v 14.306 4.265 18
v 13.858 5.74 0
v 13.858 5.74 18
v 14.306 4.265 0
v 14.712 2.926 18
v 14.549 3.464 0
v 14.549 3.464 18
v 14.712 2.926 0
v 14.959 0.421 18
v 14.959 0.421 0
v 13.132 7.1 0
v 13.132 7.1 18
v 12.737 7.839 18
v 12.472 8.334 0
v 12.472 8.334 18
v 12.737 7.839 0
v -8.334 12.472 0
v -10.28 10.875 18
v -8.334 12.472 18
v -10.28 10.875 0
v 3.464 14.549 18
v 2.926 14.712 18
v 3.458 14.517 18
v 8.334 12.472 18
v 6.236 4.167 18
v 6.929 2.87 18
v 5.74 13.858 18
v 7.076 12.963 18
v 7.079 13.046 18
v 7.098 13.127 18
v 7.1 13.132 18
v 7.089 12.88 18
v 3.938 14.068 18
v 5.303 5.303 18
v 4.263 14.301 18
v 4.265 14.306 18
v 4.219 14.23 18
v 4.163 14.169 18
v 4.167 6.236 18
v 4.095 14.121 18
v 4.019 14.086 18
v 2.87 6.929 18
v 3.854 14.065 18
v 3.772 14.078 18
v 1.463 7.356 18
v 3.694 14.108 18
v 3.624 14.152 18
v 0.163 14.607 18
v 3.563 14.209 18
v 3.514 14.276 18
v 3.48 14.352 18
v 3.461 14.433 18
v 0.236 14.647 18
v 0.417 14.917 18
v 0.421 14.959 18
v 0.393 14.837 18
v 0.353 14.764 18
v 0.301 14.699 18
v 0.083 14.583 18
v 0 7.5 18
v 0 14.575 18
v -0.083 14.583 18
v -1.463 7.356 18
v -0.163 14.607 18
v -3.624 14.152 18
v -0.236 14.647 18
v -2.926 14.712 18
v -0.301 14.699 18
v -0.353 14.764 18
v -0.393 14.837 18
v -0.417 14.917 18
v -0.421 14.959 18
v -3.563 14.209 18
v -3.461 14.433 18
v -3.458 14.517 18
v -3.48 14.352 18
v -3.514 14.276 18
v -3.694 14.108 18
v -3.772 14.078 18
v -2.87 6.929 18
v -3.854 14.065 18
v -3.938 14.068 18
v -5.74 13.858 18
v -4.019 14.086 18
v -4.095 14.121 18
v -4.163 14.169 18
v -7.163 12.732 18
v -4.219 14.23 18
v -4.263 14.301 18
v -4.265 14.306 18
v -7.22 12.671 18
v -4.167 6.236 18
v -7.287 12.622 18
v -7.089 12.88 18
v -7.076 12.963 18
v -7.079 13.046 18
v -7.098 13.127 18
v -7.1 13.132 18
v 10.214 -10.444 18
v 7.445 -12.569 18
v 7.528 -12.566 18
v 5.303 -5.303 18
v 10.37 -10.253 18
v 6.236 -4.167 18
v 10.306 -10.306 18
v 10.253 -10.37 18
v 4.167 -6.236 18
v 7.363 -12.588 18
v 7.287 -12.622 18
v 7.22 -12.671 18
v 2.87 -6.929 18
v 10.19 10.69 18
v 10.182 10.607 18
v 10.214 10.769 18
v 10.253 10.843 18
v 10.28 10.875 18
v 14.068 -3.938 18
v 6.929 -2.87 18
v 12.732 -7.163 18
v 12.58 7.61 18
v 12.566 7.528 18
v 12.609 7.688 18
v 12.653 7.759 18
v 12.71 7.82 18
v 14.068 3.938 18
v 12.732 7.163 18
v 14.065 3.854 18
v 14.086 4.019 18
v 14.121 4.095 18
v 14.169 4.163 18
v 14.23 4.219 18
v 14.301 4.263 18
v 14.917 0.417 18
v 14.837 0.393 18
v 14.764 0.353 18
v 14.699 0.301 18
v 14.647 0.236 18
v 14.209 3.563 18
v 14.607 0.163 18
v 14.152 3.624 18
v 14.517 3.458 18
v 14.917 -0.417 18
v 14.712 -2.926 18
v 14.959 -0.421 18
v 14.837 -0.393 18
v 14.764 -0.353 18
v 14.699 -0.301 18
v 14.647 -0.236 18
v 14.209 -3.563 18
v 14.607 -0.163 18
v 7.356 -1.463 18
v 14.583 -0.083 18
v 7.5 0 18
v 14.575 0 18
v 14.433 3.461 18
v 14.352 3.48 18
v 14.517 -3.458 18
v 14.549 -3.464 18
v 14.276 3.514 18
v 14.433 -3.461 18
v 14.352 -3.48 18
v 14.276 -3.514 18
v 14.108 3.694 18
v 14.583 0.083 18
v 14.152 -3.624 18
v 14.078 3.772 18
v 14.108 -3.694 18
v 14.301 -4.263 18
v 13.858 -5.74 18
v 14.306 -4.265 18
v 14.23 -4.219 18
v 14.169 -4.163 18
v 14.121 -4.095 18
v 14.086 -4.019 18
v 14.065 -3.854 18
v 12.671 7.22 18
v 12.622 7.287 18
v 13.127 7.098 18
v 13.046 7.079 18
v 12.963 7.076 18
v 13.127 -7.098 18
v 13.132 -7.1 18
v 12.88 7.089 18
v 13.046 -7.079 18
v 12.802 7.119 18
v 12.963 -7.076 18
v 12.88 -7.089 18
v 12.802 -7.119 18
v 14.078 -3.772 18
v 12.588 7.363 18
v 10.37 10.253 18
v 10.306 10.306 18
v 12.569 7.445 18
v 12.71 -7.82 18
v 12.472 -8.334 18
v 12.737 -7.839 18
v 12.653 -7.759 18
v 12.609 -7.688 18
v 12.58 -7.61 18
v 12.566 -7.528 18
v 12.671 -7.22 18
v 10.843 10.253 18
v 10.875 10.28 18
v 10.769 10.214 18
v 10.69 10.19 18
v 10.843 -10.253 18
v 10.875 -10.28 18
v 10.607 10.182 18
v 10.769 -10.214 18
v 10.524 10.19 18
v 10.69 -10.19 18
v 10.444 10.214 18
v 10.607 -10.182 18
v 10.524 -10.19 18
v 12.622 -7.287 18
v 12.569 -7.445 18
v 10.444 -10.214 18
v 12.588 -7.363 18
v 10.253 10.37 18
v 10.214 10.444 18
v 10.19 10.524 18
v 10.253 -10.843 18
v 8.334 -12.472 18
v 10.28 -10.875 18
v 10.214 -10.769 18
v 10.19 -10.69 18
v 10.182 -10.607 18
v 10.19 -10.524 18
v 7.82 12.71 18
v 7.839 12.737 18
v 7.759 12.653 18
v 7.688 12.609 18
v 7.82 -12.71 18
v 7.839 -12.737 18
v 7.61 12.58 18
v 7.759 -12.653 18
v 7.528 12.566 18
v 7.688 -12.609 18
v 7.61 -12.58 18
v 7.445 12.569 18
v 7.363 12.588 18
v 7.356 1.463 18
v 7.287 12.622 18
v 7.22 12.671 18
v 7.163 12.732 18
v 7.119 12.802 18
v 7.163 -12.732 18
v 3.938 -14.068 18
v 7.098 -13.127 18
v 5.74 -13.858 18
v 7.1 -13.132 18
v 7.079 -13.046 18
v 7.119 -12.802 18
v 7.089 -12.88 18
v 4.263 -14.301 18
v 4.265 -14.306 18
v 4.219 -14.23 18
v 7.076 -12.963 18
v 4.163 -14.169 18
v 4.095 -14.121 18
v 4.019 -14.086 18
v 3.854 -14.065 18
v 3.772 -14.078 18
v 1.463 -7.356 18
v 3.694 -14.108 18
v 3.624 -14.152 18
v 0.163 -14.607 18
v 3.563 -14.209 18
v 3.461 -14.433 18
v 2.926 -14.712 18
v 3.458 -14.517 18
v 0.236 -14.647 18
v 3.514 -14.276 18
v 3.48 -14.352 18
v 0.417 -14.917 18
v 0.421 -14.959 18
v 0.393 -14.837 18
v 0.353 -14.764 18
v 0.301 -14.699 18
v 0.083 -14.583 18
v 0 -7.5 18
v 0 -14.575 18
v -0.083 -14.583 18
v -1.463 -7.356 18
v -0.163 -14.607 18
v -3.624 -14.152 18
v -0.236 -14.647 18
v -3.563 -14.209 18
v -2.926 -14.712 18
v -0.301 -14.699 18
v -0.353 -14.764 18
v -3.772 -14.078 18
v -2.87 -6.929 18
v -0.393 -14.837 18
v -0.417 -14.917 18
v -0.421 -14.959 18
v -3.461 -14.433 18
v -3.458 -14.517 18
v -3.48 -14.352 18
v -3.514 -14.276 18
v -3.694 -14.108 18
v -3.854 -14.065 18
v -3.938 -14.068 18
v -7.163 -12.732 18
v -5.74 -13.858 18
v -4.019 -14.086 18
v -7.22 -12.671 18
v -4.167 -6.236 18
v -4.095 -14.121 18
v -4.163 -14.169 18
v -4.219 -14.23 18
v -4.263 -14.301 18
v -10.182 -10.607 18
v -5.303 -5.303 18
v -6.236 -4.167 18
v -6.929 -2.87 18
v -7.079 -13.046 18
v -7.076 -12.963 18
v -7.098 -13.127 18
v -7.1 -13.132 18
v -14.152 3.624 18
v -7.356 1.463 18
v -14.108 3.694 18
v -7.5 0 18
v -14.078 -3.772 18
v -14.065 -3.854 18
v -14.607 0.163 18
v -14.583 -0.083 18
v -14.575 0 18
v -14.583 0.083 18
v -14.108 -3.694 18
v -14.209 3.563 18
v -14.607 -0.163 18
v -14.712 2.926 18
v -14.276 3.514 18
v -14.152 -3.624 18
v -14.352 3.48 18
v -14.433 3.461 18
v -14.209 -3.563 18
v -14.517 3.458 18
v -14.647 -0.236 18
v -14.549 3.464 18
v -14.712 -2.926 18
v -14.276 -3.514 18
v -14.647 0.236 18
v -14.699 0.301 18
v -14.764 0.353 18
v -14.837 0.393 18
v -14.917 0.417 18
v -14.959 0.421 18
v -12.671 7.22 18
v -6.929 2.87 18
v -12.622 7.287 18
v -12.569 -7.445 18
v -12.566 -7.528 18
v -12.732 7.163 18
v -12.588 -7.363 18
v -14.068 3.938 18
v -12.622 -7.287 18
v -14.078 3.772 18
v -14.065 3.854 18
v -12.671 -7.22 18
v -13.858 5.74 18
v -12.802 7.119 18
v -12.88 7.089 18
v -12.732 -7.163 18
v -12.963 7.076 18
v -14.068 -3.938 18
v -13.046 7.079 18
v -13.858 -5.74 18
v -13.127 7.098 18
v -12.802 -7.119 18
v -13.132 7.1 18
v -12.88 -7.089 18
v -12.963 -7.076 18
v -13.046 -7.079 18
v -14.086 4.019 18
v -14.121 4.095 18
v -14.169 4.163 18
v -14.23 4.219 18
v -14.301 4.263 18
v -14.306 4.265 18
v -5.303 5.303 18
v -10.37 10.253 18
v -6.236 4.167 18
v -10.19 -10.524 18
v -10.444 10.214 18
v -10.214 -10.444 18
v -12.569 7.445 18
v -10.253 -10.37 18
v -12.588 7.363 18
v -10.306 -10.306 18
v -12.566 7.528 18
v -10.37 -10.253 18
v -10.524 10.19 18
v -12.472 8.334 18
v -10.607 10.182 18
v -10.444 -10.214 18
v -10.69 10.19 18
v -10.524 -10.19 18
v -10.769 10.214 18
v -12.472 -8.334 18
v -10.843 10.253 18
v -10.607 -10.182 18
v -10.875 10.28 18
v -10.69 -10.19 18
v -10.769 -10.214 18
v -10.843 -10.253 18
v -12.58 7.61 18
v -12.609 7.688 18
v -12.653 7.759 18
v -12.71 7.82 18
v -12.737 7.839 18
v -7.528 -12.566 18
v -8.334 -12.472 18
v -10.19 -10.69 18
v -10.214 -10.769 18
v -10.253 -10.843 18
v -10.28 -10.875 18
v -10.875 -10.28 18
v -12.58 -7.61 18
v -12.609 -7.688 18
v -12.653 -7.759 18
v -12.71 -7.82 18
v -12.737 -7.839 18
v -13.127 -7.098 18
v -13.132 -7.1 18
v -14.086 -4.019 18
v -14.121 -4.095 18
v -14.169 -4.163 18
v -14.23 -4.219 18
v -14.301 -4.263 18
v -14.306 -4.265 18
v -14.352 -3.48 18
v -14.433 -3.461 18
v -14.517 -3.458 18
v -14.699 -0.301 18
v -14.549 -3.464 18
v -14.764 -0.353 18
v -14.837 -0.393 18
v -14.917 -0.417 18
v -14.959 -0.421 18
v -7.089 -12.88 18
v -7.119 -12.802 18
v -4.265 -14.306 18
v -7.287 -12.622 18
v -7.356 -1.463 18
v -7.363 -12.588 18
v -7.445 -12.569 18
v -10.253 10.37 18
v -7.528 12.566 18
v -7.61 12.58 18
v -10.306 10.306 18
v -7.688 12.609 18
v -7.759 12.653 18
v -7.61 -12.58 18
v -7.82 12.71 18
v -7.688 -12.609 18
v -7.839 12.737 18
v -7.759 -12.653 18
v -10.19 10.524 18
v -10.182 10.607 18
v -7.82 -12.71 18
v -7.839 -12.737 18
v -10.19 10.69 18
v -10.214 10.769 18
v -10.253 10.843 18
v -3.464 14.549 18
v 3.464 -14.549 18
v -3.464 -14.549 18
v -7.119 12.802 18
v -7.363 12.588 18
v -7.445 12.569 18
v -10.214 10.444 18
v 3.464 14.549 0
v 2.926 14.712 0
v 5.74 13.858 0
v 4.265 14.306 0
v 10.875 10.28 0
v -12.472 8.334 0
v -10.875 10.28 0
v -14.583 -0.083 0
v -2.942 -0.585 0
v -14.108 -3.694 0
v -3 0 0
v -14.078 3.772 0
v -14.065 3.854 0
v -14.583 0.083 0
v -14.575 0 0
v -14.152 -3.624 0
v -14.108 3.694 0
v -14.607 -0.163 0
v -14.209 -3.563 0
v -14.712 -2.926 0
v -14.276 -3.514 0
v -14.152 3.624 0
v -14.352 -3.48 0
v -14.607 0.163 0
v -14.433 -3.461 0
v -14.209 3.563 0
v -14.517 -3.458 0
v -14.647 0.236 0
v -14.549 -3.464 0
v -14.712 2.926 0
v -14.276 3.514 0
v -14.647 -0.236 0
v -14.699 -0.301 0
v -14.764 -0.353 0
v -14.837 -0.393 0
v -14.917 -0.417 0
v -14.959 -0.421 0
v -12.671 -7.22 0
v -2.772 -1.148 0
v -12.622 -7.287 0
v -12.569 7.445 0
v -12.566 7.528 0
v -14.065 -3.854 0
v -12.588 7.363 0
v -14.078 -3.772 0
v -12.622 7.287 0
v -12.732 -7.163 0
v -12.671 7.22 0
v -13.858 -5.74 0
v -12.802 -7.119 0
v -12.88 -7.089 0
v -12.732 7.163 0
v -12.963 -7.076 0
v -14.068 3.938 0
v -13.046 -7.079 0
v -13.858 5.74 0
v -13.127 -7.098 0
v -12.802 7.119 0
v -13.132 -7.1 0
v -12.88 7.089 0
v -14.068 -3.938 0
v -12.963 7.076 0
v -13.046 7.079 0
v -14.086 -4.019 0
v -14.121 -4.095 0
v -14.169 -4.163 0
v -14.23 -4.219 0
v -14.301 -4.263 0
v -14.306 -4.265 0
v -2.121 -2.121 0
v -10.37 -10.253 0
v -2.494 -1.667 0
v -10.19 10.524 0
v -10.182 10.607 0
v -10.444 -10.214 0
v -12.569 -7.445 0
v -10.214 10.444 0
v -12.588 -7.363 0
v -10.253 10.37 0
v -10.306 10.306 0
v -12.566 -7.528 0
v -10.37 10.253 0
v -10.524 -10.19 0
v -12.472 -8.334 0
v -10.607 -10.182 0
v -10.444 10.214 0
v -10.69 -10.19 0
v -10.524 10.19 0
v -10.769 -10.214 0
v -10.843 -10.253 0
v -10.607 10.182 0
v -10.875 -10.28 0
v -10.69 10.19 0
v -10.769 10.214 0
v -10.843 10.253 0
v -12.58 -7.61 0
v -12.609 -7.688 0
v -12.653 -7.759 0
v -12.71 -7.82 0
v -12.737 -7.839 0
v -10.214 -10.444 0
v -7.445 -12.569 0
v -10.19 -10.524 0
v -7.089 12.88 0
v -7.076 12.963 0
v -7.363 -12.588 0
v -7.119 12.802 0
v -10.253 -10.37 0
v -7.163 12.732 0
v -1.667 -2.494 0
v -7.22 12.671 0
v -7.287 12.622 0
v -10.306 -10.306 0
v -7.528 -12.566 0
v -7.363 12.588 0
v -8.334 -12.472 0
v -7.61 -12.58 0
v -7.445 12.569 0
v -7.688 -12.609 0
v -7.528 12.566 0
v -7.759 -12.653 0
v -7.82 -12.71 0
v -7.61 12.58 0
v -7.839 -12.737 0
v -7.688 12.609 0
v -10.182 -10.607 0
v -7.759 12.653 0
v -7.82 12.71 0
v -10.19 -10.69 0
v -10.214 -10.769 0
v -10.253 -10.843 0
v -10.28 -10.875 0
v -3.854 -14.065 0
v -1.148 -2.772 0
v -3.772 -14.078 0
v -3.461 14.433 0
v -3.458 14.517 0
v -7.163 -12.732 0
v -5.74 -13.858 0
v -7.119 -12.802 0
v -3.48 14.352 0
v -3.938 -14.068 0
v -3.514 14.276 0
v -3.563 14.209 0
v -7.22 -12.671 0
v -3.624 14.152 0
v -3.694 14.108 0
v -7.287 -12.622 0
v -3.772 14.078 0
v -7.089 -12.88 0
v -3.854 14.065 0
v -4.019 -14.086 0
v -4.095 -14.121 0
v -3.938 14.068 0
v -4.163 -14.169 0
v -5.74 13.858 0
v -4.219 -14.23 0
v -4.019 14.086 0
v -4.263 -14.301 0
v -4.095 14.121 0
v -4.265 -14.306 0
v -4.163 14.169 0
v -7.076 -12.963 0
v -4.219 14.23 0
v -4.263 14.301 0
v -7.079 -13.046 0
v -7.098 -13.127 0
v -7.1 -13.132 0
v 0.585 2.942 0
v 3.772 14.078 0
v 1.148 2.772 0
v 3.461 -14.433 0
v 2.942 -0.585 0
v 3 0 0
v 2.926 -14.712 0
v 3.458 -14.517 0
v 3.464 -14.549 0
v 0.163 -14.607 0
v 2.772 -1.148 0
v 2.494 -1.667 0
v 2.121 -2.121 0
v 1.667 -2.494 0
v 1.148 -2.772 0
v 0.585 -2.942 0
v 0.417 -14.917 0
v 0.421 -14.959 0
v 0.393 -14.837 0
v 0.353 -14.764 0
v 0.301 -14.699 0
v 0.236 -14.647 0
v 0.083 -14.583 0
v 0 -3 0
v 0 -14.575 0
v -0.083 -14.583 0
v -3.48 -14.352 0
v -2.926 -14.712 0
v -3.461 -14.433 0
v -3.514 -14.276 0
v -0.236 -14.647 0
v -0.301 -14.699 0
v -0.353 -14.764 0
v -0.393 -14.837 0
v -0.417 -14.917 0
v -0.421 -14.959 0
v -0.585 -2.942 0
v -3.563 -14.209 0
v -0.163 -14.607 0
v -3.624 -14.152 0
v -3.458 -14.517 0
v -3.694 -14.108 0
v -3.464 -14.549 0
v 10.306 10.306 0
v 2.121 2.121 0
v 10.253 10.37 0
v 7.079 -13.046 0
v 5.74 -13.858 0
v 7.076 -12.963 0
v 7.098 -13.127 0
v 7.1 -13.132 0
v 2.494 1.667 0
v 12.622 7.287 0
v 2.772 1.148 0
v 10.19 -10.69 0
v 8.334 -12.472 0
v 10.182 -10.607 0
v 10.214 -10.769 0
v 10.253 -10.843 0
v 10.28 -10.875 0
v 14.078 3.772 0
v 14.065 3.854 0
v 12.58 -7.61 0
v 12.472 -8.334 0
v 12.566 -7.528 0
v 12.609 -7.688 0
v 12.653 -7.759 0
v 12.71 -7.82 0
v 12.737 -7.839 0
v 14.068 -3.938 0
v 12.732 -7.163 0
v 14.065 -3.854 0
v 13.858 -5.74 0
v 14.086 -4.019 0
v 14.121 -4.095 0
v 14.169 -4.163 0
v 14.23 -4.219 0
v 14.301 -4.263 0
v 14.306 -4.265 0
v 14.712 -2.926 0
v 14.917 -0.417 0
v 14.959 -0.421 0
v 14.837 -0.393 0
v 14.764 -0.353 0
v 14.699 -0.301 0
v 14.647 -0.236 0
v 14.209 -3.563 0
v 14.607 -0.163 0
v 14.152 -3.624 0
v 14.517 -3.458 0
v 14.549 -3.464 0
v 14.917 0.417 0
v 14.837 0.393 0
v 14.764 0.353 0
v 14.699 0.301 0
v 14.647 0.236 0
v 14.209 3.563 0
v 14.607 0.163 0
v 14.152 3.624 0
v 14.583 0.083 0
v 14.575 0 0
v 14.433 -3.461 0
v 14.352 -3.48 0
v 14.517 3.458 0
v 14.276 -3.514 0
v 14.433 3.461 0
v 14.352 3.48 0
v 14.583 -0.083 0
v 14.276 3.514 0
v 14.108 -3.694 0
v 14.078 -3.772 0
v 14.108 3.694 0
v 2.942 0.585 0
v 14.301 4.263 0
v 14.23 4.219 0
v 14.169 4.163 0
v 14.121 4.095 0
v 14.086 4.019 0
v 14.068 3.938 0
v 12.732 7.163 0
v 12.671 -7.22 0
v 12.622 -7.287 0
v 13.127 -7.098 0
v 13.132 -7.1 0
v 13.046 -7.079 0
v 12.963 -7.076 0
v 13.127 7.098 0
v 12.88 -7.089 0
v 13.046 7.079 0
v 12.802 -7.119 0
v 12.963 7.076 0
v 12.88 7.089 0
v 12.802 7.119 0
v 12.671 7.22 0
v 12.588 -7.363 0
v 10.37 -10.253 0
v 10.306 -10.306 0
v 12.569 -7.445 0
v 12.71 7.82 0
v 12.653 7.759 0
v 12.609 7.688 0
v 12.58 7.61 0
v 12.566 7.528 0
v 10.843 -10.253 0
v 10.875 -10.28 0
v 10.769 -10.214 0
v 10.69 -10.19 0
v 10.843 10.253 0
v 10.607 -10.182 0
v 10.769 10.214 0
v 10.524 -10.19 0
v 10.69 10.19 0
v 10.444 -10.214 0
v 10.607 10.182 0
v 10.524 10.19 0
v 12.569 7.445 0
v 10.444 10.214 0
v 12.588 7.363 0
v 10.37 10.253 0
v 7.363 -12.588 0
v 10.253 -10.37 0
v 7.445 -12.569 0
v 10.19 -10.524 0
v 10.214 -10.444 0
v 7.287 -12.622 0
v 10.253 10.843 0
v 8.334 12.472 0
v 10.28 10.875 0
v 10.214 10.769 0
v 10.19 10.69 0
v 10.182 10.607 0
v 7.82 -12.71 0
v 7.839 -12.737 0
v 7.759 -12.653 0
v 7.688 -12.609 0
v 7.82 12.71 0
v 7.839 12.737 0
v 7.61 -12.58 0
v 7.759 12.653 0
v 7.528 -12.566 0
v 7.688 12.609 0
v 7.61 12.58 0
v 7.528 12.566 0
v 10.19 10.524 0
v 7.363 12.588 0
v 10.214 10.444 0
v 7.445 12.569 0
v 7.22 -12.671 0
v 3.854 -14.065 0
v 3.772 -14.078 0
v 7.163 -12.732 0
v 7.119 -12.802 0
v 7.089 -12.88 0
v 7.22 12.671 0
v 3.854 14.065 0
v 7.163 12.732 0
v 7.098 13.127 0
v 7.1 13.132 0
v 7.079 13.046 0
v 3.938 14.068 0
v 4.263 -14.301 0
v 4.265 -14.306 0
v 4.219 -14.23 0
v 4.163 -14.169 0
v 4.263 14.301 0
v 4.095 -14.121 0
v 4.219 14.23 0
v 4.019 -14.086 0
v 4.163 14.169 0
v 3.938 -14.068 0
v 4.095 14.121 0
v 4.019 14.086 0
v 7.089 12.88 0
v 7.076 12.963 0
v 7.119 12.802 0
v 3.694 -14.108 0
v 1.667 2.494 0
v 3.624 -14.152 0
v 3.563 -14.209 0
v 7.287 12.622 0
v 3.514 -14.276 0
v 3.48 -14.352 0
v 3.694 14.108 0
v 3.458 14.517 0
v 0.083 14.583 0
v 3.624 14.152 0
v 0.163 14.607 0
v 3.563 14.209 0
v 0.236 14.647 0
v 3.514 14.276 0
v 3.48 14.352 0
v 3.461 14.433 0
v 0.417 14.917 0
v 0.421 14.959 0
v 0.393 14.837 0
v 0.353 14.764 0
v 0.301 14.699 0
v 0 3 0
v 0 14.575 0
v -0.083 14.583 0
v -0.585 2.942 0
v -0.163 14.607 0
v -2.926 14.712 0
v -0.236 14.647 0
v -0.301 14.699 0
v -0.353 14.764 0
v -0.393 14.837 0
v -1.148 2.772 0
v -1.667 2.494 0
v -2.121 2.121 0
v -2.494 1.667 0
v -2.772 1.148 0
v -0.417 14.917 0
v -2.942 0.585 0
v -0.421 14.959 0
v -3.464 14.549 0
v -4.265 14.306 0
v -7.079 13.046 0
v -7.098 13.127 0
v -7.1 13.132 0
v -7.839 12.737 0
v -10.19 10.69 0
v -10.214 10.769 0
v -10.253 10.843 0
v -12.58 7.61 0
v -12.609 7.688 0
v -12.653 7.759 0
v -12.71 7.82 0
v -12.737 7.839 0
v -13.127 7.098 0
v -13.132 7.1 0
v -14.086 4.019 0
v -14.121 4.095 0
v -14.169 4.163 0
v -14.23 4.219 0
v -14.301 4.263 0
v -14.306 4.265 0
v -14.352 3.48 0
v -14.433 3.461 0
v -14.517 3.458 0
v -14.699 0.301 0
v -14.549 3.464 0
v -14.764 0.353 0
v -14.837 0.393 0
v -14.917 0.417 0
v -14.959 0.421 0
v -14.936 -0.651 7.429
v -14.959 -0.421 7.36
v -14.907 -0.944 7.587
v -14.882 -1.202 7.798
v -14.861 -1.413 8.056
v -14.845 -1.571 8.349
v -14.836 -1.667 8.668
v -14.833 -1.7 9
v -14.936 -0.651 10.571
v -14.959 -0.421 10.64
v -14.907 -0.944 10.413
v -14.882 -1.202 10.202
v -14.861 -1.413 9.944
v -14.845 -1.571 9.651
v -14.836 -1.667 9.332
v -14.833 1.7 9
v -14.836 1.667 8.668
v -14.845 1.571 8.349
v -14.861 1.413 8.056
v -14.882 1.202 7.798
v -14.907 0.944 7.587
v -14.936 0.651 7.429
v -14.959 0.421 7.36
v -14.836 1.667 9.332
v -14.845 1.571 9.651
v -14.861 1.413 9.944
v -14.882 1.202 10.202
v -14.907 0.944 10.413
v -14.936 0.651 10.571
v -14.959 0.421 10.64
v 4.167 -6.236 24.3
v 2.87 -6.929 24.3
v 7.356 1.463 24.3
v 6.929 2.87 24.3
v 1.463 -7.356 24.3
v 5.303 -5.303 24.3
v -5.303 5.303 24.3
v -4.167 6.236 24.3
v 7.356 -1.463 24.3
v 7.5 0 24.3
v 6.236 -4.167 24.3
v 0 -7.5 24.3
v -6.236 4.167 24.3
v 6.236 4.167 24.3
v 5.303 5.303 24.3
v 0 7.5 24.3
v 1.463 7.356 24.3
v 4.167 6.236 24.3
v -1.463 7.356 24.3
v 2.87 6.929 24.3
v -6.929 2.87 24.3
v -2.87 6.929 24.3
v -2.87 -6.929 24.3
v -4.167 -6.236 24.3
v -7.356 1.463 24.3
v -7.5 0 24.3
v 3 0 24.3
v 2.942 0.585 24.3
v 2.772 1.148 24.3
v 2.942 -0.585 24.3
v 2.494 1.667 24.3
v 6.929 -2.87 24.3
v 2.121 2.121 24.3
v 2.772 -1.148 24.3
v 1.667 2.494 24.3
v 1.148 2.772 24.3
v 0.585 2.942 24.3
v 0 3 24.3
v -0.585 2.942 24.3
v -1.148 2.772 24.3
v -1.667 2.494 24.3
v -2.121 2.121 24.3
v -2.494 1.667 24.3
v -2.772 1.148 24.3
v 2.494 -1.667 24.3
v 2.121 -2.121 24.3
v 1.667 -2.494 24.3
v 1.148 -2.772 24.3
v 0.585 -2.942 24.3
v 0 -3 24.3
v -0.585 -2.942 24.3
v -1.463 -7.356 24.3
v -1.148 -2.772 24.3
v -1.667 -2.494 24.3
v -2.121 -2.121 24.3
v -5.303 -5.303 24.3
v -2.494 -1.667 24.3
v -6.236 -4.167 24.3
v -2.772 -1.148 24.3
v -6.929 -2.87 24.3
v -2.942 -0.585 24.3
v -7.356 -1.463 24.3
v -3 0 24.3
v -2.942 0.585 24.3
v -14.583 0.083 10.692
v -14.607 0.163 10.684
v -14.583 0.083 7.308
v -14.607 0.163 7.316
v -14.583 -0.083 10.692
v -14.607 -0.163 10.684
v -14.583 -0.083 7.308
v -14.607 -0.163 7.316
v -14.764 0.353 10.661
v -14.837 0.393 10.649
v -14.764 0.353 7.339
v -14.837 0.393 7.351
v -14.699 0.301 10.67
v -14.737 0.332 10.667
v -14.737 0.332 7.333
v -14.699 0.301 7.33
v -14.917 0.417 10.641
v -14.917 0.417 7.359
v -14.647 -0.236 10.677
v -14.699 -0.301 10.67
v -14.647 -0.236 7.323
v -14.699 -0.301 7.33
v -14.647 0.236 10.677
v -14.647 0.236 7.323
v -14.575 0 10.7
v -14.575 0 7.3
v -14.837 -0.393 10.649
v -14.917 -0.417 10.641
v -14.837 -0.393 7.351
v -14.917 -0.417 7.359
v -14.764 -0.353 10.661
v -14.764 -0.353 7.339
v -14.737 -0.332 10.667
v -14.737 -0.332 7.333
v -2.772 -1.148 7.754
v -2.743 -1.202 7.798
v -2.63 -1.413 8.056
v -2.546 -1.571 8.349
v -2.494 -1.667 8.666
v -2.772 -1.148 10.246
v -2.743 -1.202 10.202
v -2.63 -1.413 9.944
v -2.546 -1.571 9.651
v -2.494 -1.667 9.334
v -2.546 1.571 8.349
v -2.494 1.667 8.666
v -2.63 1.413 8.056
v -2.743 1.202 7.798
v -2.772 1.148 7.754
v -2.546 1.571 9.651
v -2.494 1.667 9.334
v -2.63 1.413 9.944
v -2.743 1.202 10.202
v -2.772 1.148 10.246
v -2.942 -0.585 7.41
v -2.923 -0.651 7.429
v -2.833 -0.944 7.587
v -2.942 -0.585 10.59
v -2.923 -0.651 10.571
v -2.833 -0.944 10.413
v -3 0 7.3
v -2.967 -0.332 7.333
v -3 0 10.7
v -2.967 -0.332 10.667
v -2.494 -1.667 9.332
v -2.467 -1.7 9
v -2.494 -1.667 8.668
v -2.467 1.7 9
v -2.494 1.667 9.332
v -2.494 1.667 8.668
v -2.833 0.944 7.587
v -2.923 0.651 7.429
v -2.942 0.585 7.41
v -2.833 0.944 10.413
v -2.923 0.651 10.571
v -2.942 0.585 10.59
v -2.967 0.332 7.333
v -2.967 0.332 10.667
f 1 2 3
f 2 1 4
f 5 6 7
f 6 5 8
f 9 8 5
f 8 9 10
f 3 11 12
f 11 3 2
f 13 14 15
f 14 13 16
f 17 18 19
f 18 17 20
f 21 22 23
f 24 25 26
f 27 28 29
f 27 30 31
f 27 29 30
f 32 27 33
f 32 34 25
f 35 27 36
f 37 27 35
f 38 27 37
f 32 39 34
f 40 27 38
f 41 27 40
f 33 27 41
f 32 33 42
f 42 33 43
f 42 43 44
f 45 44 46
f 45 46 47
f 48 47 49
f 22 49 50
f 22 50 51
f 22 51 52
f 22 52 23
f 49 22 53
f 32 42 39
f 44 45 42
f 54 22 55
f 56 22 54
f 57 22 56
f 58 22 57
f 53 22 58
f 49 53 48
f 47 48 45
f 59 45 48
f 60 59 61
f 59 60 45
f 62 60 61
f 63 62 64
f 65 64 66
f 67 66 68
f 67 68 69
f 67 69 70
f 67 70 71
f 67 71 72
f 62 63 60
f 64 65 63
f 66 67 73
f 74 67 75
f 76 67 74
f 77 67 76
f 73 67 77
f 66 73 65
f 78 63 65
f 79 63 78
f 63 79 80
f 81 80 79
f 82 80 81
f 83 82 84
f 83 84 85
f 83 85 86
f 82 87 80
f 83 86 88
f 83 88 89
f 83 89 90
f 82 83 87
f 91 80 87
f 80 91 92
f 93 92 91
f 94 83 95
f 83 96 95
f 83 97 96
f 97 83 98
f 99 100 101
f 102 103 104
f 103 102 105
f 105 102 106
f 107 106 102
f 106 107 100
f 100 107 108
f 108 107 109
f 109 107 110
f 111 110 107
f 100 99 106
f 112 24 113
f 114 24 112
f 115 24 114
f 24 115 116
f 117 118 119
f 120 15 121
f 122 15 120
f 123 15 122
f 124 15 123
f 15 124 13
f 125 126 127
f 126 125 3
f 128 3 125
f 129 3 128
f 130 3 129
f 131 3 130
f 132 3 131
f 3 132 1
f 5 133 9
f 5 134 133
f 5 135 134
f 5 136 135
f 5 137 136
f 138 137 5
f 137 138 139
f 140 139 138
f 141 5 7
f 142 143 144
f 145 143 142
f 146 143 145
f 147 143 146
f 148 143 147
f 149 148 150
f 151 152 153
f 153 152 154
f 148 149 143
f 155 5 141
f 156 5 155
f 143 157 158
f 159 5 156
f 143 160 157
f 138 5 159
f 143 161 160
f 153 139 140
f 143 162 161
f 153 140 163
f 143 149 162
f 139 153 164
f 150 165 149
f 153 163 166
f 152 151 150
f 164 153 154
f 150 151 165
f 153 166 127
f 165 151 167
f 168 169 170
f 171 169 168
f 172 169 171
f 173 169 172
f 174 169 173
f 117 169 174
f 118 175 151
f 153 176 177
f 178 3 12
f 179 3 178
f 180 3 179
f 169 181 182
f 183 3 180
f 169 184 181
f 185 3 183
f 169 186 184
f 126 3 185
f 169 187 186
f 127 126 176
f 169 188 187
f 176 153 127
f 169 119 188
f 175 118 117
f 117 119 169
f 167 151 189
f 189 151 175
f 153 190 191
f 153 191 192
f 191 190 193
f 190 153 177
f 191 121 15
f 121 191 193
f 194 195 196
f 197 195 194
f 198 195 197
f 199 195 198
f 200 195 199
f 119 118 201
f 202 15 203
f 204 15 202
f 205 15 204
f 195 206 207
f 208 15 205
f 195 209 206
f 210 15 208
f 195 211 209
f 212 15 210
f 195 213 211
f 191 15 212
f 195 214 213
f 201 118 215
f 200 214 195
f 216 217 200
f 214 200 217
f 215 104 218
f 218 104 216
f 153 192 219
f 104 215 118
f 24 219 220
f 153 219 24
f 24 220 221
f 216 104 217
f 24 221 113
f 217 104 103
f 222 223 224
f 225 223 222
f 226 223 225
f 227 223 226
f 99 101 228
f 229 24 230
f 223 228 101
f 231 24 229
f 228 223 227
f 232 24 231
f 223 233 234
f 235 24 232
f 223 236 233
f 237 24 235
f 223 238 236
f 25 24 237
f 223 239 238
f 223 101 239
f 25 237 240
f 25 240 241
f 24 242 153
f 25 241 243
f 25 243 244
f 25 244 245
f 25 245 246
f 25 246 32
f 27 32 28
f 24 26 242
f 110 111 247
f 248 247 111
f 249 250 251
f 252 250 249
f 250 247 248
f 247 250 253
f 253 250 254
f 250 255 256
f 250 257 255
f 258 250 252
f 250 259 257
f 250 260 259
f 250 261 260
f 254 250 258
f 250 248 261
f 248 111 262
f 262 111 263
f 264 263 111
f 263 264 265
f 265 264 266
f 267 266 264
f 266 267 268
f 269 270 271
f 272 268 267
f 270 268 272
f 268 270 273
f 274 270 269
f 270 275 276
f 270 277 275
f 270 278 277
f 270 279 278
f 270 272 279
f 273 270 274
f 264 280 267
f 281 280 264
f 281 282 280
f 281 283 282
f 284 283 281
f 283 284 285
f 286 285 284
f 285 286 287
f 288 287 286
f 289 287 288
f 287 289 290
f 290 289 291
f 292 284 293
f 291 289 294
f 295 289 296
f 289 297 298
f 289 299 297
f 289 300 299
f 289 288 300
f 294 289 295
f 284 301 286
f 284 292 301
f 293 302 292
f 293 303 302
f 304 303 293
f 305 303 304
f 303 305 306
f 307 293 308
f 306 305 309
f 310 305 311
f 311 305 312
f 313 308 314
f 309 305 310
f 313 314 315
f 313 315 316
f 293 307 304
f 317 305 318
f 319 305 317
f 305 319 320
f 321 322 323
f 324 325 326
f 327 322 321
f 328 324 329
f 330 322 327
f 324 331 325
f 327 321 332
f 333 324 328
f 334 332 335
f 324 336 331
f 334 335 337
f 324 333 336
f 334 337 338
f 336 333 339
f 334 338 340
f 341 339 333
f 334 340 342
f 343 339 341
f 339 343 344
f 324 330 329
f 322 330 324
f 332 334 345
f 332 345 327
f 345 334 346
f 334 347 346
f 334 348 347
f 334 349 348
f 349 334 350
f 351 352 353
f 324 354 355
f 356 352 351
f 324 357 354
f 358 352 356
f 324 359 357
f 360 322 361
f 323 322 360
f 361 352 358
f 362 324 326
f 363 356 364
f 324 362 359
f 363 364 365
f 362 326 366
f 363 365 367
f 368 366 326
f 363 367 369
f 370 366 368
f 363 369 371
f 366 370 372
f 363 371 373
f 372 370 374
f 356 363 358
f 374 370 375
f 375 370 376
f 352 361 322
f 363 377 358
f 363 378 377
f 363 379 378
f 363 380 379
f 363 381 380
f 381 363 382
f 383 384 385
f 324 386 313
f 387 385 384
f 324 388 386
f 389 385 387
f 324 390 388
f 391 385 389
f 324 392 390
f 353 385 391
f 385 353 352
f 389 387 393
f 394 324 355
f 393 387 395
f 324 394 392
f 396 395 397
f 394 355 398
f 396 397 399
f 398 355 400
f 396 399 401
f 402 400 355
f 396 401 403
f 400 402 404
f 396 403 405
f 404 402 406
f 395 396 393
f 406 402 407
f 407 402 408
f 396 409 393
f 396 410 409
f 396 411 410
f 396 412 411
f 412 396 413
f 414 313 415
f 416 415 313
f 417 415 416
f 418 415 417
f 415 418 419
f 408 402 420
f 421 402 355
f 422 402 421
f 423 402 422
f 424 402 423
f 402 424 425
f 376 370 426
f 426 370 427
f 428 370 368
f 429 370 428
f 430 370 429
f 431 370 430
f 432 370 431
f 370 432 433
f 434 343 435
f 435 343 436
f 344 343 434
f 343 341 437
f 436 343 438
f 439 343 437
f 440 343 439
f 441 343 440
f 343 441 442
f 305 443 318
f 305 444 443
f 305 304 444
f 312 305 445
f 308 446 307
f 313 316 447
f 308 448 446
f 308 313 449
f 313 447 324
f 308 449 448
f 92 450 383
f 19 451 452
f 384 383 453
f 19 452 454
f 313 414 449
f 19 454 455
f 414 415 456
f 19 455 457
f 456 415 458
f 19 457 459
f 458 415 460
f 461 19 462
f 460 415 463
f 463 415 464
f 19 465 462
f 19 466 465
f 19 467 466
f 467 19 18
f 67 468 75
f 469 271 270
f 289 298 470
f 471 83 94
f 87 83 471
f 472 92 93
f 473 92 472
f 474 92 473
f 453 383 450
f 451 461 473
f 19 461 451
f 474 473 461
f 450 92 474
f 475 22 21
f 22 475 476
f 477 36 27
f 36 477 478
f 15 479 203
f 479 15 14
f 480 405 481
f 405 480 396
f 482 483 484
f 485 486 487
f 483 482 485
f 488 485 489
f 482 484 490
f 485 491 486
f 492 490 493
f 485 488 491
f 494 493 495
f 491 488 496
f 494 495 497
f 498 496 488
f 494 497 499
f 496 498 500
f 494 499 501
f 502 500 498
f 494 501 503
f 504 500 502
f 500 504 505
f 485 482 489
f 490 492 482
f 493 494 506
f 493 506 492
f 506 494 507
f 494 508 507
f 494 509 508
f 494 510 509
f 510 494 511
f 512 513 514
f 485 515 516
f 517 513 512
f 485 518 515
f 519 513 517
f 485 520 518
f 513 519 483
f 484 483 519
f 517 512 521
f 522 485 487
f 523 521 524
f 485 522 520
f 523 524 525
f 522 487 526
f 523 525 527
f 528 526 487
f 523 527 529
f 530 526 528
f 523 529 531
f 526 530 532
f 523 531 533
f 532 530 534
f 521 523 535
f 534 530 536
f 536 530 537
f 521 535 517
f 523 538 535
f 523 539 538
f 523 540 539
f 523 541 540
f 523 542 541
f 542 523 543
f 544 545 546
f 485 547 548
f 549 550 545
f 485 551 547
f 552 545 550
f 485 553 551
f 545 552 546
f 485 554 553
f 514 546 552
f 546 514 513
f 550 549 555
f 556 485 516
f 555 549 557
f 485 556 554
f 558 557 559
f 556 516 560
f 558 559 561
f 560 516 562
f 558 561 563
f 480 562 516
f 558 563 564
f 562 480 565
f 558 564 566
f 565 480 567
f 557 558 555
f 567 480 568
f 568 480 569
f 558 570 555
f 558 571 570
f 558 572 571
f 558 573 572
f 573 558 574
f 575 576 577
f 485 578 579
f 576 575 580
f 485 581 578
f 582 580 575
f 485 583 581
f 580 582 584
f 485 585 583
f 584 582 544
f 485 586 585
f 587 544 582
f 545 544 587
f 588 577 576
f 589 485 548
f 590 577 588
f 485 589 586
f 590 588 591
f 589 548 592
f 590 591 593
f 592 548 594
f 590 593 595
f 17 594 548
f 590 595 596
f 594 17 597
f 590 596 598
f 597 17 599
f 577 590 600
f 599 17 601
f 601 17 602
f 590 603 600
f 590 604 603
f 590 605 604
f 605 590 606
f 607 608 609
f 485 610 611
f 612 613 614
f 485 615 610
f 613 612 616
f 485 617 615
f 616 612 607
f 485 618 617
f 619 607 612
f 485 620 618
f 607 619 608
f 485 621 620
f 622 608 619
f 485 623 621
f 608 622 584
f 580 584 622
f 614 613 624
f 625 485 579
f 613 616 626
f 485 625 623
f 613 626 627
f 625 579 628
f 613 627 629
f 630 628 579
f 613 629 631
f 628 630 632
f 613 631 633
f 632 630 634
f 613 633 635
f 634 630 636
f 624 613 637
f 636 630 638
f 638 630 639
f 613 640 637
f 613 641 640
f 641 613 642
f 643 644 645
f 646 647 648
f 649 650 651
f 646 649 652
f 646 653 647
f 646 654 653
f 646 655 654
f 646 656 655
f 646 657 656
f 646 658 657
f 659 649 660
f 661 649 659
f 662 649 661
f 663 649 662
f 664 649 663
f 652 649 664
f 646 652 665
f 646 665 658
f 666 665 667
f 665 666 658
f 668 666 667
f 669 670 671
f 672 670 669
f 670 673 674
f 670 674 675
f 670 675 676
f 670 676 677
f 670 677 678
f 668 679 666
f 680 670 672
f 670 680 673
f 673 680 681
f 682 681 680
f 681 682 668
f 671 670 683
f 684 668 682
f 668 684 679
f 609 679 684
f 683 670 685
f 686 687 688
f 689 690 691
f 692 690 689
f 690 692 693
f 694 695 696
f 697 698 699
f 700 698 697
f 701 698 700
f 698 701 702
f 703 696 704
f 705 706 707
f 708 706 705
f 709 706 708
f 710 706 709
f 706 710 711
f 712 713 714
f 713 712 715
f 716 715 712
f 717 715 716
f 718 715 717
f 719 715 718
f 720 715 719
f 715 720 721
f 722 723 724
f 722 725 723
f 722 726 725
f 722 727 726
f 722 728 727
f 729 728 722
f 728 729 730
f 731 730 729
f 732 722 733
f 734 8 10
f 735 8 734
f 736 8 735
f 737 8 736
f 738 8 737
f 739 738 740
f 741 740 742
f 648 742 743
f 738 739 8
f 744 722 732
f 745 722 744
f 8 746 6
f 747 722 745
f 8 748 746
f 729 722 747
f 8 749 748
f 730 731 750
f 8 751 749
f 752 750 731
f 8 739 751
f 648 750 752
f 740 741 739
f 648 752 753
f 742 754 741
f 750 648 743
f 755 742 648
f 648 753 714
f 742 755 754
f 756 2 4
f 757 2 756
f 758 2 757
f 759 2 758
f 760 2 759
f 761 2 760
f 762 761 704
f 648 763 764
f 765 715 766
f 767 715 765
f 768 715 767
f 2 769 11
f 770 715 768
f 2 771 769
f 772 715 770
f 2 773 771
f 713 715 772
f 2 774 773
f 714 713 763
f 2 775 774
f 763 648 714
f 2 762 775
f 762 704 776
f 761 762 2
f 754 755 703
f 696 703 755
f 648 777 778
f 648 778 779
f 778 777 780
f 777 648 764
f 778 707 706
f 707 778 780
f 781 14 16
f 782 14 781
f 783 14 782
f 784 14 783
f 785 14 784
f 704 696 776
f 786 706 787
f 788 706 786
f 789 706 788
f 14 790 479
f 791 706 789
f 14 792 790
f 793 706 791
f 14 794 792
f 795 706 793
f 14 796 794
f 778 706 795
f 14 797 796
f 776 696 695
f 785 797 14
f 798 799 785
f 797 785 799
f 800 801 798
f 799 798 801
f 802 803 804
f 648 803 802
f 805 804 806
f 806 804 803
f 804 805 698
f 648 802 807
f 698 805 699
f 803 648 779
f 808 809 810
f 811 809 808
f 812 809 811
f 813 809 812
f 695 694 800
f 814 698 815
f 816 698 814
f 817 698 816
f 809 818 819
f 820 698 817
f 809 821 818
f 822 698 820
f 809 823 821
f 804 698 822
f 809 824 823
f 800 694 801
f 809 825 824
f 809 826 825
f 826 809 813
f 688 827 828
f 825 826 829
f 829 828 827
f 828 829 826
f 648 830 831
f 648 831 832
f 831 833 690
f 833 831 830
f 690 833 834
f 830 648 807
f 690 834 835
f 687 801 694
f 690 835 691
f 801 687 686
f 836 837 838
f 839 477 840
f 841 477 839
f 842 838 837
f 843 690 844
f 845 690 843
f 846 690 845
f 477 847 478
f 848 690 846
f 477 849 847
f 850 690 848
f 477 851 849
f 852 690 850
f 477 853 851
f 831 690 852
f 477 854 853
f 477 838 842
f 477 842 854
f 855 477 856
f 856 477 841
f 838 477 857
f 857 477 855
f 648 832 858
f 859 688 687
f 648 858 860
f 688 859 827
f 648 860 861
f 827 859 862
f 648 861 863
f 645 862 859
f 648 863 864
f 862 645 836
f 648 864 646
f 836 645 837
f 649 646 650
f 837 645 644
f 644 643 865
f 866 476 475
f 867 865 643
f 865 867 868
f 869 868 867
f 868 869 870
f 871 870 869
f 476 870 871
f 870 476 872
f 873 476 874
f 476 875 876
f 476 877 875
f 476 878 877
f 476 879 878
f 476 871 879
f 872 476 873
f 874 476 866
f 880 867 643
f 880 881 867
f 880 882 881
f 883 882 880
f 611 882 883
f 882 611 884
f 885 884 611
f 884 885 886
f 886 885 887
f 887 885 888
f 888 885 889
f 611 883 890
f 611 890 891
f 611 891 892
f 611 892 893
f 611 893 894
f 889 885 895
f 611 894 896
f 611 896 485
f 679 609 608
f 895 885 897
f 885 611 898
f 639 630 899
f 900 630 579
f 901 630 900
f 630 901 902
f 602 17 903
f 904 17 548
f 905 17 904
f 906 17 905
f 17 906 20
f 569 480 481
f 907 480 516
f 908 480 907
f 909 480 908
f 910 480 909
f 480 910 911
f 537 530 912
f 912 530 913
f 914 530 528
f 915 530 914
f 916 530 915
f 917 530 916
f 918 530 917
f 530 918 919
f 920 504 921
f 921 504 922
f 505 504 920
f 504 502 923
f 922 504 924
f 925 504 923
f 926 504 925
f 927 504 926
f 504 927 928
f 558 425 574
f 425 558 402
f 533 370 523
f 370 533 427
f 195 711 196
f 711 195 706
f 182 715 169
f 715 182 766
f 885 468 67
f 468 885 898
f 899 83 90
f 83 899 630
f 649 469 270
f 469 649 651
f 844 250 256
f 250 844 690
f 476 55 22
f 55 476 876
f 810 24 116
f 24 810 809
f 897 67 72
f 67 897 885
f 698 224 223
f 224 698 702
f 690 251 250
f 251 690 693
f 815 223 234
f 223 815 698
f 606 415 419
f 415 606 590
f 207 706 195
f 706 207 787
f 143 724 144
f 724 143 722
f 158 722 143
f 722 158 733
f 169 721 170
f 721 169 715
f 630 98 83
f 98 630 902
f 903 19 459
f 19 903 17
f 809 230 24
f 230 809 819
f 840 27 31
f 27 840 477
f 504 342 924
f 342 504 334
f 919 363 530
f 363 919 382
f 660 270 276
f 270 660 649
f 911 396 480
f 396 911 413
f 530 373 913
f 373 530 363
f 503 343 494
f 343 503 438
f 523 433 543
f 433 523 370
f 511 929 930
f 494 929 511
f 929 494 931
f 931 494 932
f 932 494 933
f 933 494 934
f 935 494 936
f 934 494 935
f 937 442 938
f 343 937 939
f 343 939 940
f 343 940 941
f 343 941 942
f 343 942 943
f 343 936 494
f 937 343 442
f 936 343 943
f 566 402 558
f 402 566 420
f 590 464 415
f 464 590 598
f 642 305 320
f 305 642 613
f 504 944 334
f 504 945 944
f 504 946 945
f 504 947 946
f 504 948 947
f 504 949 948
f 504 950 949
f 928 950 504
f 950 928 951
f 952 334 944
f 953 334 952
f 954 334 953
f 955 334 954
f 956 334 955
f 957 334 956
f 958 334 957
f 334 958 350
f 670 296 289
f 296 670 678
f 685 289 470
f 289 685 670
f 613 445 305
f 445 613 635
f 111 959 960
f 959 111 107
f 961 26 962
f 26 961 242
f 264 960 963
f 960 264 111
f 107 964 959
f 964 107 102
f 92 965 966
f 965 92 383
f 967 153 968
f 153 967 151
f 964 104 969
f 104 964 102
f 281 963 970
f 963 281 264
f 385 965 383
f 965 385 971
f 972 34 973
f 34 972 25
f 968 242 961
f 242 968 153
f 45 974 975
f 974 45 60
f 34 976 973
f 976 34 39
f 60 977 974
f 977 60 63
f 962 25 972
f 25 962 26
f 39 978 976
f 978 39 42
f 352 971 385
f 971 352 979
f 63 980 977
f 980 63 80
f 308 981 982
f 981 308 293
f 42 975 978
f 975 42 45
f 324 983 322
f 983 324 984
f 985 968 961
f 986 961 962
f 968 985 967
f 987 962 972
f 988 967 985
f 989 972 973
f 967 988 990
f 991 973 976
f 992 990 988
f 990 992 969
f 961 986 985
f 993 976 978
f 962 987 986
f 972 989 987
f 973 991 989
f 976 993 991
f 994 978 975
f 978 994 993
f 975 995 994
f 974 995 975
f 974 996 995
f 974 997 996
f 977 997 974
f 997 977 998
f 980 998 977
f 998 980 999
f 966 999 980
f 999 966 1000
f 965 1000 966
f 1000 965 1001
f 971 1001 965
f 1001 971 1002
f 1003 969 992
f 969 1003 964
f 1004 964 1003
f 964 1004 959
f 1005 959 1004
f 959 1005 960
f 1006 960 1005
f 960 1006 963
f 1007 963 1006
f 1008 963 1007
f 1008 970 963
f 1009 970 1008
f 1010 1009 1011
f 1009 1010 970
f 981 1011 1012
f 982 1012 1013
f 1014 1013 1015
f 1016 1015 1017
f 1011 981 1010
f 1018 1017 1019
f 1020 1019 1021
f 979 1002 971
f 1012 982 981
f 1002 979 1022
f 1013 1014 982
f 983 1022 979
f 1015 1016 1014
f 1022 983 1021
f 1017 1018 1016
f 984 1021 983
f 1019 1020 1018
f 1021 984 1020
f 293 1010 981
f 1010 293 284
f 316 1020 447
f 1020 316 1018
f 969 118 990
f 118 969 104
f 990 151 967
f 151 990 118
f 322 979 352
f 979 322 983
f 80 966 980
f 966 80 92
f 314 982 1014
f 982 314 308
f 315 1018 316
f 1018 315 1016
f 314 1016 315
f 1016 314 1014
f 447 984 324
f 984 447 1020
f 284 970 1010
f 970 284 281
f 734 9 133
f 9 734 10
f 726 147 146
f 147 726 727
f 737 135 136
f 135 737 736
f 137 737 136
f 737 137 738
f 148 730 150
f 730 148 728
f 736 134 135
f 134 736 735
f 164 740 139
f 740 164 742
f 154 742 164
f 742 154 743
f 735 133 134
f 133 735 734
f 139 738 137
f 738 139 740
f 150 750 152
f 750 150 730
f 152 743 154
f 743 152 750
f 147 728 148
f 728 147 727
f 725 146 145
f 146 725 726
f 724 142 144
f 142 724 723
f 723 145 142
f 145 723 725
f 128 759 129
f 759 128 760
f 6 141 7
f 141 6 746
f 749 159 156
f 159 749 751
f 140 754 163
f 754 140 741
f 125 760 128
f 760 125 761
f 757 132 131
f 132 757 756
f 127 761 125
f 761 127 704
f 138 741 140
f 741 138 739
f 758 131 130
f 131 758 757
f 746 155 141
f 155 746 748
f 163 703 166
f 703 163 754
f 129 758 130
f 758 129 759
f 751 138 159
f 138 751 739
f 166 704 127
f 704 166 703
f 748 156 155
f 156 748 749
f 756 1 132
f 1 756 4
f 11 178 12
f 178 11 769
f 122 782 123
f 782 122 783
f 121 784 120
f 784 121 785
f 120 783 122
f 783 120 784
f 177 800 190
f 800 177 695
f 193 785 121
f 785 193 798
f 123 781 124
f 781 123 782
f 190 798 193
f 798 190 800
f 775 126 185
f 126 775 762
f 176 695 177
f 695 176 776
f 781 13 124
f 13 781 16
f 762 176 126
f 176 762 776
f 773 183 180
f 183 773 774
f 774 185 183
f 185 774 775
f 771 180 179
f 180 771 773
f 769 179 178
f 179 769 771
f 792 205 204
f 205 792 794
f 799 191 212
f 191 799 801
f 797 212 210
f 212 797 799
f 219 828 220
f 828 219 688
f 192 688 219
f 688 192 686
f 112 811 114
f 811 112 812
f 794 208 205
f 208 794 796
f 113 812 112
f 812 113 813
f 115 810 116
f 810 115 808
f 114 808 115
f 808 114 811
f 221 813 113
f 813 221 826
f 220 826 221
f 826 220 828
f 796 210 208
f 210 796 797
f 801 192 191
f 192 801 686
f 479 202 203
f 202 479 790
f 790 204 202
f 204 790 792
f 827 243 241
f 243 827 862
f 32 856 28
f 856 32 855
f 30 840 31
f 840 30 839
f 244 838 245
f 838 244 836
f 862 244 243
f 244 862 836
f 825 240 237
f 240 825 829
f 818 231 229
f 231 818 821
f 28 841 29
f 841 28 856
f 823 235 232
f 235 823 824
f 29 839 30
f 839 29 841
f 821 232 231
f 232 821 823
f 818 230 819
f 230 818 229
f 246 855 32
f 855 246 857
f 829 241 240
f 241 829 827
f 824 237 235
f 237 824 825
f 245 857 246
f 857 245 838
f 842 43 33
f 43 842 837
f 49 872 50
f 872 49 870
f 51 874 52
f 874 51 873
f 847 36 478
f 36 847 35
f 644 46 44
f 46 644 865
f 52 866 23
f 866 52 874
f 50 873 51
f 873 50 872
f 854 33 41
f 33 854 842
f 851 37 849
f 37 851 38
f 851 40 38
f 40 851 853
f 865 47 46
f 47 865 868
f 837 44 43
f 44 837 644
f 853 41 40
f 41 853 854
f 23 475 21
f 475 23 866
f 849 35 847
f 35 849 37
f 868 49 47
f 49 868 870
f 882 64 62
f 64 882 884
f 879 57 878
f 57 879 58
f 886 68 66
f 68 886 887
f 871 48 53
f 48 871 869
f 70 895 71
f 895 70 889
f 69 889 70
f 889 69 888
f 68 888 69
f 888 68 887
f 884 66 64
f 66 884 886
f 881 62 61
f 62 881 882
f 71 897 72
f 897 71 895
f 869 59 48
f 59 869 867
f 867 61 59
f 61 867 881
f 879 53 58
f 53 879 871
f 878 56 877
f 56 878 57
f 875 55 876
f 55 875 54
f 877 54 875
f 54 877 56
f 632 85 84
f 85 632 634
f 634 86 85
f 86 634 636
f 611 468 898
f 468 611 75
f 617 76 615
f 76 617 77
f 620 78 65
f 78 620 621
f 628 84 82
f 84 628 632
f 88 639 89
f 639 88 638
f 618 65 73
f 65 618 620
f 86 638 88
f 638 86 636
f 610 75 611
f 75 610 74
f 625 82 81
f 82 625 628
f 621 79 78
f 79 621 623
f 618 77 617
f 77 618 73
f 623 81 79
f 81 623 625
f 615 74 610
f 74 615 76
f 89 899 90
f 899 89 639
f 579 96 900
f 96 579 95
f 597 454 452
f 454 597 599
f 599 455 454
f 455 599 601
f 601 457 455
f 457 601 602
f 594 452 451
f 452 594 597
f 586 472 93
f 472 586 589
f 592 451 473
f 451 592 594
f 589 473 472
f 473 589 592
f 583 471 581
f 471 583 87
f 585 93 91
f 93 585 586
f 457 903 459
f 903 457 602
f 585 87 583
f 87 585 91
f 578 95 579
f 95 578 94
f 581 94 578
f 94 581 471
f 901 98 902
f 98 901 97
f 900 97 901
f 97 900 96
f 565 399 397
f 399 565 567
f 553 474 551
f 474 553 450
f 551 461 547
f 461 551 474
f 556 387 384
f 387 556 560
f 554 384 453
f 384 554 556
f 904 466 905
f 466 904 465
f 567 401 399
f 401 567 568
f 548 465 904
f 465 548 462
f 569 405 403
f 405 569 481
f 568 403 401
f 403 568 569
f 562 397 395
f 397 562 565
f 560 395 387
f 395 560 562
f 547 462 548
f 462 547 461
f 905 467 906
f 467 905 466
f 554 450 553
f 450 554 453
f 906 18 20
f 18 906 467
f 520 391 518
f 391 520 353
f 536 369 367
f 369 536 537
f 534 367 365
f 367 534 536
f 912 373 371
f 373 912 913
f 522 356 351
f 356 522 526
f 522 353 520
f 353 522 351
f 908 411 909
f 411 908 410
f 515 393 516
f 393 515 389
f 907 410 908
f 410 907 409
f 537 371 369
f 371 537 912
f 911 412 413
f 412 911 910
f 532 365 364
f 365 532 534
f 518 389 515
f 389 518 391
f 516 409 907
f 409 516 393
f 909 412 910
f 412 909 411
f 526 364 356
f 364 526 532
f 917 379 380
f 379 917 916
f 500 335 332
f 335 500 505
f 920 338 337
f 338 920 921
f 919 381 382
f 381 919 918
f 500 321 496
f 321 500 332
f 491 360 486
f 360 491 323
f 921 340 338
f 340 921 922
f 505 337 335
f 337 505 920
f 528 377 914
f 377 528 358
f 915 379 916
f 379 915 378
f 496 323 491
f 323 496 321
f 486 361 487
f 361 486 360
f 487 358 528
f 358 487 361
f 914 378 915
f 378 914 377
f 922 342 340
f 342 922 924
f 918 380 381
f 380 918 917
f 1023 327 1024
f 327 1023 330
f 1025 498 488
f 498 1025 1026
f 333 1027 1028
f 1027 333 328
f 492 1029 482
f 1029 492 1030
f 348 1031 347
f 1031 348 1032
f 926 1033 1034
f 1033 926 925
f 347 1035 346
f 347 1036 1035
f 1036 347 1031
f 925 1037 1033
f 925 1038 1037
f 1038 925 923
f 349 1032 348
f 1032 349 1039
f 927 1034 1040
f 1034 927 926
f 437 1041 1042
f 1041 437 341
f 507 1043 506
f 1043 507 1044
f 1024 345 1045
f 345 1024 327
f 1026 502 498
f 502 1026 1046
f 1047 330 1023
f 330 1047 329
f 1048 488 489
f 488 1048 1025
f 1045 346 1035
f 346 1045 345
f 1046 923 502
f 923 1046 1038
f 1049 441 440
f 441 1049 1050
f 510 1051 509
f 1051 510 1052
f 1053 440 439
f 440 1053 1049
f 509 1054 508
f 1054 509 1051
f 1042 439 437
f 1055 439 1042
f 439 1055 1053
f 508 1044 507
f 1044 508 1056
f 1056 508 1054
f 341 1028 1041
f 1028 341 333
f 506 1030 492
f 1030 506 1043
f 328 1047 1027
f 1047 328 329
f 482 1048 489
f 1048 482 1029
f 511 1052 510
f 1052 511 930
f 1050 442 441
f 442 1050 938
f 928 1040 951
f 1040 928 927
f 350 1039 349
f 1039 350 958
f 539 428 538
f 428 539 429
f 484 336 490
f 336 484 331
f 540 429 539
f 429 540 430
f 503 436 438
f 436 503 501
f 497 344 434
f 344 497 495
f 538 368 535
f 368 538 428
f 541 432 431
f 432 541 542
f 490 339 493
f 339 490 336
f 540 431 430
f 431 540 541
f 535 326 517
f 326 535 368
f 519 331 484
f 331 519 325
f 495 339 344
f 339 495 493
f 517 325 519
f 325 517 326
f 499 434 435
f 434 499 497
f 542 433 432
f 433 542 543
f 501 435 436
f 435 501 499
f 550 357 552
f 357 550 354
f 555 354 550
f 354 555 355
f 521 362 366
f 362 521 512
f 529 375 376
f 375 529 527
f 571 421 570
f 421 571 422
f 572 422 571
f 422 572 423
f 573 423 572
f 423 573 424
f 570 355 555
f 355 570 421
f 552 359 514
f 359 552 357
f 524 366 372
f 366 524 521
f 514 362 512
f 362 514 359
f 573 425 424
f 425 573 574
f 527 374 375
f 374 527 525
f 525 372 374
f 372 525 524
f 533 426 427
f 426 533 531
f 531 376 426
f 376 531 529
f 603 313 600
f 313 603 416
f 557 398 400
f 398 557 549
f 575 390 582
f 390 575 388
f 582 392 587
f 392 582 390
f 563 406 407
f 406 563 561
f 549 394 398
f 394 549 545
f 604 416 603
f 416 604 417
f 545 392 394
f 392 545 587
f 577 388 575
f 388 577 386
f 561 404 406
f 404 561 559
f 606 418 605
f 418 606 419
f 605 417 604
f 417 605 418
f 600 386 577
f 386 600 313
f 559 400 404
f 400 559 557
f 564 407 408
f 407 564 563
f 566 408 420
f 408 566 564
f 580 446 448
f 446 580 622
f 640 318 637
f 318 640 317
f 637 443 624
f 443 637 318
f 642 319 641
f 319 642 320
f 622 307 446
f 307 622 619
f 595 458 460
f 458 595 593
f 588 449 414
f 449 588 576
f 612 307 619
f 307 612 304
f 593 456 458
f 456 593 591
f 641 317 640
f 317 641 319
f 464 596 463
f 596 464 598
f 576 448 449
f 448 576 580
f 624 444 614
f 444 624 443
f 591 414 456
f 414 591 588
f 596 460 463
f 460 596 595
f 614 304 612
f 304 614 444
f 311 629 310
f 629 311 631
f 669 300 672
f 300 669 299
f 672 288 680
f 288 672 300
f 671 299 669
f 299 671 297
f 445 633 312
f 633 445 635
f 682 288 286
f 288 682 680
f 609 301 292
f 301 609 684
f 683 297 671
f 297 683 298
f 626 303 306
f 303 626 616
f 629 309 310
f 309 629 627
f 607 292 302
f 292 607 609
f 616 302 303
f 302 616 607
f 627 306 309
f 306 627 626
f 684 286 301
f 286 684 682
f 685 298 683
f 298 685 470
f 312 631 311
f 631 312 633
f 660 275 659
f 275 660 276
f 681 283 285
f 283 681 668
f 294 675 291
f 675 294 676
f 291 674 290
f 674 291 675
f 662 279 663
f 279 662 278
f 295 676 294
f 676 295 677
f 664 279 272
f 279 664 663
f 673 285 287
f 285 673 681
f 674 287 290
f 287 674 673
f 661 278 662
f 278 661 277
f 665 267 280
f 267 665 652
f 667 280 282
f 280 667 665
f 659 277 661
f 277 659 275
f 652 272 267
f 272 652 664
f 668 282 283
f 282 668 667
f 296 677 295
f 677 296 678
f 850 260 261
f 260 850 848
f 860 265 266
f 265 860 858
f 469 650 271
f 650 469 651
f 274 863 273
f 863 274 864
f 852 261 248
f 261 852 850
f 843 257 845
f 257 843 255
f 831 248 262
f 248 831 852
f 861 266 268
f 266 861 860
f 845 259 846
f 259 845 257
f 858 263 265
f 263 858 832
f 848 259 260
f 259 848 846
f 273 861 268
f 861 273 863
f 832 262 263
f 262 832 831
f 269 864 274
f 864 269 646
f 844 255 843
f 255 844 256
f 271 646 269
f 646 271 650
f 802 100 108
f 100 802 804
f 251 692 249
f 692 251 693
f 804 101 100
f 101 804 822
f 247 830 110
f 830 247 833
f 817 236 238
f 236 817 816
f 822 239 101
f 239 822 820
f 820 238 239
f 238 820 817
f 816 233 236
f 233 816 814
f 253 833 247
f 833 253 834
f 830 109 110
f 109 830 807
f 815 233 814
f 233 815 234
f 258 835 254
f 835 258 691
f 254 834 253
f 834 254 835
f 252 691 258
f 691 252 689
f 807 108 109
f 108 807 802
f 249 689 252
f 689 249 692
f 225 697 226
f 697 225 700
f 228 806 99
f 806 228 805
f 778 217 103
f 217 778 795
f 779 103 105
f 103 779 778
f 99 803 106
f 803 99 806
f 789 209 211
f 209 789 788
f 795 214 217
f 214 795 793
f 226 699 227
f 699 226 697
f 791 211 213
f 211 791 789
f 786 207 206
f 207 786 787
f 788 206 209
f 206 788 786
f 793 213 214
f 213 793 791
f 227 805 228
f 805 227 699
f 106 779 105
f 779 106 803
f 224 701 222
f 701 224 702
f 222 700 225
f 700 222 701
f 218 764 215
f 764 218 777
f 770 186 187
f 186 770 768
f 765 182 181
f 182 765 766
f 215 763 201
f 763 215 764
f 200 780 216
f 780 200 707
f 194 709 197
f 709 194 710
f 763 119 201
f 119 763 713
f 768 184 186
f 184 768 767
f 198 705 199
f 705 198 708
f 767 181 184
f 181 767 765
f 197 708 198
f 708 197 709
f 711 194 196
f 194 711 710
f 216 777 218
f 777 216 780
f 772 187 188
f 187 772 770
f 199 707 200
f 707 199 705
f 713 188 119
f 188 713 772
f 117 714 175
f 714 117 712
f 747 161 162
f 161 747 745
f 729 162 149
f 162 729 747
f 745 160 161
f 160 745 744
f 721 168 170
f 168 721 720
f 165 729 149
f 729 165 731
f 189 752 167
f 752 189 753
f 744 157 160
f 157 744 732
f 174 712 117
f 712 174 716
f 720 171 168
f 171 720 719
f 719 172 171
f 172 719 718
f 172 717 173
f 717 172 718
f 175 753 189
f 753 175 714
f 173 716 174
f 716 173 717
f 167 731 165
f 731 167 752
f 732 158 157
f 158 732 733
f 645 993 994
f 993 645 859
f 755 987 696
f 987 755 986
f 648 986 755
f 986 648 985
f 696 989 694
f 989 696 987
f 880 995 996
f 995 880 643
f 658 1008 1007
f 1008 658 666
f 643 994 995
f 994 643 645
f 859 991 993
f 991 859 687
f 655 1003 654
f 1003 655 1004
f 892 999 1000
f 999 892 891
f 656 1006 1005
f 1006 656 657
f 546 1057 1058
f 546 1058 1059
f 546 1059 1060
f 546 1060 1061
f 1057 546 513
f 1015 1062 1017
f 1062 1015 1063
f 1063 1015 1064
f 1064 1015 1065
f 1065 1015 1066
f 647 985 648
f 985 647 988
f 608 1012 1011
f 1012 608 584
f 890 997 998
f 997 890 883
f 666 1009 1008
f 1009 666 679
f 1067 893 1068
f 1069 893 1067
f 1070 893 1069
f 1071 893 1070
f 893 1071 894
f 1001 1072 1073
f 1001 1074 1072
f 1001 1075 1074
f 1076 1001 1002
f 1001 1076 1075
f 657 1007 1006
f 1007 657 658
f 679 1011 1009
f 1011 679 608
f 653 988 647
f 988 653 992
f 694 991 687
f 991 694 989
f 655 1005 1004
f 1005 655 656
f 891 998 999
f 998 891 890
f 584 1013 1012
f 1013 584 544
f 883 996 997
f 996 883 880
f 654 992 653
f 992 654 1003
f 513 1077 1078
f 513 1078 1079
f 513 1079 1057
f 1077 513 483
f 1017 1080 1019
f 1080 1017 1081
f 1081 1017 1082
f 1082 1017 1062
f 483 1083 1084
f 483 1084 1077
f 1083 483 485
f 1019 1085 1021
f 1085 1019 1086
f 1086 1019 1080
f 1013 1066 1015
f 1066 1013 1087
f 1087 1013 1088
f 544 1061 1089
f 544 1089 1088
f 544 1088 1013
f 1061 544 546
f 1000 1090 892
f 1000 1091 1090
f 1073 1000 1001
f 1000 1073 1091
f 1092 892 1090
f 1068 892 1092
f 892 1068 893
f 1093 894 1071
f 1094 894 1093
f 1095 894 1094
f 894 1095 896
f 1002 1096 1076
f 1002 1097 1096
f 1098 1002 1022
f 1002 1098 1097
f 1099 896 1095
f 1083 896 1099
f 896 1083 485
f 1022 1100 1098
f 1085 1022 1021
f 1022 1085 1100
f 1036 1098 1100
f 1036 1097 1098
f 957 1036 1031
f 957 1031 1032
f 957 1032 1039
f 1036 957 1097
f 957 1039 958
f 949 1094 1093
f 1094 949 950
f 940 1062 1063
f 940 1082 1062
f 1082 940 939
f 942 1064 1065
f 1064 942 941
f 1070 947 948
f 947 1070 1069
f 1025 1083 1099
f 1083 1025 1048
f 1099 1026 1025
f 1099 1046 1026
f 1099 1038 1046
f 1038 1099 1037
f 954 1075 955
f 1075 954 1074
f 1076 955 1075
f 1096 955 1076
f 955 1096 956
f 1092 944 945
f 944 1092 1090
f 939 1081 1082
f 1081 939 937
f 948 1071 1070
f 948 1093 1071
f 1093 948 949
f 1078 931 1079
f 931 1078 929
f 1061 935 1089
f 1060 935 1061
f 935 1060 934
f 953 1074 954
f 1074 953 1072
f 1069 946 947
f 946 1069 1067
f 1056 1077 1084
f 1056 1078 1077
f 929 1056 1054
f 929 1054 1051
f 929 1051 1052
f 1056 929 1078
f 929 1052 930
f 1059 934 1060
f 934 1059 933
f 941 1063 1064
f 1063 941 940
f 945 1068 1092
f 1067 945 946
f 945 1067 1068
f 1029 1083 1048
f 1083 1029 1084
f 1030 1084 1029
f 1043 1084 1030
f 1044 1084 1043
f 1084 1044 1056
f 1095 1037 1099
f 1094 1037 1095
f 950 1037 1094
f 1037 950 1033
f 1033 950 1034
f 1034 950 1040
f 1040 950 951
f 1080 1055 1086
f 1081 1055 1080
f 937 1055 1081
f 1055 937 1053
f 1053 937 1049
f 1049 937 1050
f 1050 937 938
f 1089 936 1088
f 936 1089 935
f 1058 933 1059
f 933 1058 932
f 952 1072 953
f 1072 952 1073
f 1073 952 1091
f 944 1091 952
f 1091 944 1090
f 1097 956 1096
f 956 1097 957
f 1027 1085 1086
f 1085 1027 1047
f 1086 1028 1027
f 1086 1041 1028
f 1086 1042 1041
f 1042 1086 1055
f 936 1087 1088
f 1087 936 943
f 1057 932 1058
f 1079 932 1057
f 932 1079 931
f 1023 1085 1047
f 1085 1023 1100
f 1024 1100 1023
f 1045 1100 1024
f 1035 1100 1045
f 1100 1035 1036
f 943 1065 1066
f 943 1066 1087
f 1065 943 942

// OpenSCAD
$fn = 32;

// ----------------------------------------------------------------------
// Hand knob: 30 x 30 x 24.3 mm
// ----------------------------------------------------------------------

// --- parameters (mm) ---
grip_d = 30;              // knob diameter
grip_h = 18;              // knob height
shaft_d = 6;              // shaft bore
set_d = 3.4;              // set screw tap hole
knurl_dia = 0.85;         // knurl groove diameter
knurl_n = 24;             // number of knurl grooves
cap_h = 6.3;              // raised centre cap
cap_d = 15;               // centre cap diameter

module body() {
  cylinder(h = grip_h, d = grip_d);
}

module cap() {
  translate([0, 0, grip_h - 1]) cylinder(h = cap_h + 1, d = cap_d);
}

difference() {
  union() {
    body();
    cap();
  }
  translate([0, 0, -1]) cylinder(h = grip_h + cap_h + 2, d = shaft_d);
  /* knurl grooves */
  for (i = [0 : knurl_n - 1])
    rotate([0, 0, i * 360 / knurl_n])
      translate([grip_d / 2, 0, -0.5])
        cylinder(h = grip_h + 1, d = knurl_dia);
  translate([-grip_d / 2 - 1, 0, grip_h * 0.5]) rotate([0, 90, 0]) cylinder(h = grip_d / 2 + 2, d = set_d);
}
